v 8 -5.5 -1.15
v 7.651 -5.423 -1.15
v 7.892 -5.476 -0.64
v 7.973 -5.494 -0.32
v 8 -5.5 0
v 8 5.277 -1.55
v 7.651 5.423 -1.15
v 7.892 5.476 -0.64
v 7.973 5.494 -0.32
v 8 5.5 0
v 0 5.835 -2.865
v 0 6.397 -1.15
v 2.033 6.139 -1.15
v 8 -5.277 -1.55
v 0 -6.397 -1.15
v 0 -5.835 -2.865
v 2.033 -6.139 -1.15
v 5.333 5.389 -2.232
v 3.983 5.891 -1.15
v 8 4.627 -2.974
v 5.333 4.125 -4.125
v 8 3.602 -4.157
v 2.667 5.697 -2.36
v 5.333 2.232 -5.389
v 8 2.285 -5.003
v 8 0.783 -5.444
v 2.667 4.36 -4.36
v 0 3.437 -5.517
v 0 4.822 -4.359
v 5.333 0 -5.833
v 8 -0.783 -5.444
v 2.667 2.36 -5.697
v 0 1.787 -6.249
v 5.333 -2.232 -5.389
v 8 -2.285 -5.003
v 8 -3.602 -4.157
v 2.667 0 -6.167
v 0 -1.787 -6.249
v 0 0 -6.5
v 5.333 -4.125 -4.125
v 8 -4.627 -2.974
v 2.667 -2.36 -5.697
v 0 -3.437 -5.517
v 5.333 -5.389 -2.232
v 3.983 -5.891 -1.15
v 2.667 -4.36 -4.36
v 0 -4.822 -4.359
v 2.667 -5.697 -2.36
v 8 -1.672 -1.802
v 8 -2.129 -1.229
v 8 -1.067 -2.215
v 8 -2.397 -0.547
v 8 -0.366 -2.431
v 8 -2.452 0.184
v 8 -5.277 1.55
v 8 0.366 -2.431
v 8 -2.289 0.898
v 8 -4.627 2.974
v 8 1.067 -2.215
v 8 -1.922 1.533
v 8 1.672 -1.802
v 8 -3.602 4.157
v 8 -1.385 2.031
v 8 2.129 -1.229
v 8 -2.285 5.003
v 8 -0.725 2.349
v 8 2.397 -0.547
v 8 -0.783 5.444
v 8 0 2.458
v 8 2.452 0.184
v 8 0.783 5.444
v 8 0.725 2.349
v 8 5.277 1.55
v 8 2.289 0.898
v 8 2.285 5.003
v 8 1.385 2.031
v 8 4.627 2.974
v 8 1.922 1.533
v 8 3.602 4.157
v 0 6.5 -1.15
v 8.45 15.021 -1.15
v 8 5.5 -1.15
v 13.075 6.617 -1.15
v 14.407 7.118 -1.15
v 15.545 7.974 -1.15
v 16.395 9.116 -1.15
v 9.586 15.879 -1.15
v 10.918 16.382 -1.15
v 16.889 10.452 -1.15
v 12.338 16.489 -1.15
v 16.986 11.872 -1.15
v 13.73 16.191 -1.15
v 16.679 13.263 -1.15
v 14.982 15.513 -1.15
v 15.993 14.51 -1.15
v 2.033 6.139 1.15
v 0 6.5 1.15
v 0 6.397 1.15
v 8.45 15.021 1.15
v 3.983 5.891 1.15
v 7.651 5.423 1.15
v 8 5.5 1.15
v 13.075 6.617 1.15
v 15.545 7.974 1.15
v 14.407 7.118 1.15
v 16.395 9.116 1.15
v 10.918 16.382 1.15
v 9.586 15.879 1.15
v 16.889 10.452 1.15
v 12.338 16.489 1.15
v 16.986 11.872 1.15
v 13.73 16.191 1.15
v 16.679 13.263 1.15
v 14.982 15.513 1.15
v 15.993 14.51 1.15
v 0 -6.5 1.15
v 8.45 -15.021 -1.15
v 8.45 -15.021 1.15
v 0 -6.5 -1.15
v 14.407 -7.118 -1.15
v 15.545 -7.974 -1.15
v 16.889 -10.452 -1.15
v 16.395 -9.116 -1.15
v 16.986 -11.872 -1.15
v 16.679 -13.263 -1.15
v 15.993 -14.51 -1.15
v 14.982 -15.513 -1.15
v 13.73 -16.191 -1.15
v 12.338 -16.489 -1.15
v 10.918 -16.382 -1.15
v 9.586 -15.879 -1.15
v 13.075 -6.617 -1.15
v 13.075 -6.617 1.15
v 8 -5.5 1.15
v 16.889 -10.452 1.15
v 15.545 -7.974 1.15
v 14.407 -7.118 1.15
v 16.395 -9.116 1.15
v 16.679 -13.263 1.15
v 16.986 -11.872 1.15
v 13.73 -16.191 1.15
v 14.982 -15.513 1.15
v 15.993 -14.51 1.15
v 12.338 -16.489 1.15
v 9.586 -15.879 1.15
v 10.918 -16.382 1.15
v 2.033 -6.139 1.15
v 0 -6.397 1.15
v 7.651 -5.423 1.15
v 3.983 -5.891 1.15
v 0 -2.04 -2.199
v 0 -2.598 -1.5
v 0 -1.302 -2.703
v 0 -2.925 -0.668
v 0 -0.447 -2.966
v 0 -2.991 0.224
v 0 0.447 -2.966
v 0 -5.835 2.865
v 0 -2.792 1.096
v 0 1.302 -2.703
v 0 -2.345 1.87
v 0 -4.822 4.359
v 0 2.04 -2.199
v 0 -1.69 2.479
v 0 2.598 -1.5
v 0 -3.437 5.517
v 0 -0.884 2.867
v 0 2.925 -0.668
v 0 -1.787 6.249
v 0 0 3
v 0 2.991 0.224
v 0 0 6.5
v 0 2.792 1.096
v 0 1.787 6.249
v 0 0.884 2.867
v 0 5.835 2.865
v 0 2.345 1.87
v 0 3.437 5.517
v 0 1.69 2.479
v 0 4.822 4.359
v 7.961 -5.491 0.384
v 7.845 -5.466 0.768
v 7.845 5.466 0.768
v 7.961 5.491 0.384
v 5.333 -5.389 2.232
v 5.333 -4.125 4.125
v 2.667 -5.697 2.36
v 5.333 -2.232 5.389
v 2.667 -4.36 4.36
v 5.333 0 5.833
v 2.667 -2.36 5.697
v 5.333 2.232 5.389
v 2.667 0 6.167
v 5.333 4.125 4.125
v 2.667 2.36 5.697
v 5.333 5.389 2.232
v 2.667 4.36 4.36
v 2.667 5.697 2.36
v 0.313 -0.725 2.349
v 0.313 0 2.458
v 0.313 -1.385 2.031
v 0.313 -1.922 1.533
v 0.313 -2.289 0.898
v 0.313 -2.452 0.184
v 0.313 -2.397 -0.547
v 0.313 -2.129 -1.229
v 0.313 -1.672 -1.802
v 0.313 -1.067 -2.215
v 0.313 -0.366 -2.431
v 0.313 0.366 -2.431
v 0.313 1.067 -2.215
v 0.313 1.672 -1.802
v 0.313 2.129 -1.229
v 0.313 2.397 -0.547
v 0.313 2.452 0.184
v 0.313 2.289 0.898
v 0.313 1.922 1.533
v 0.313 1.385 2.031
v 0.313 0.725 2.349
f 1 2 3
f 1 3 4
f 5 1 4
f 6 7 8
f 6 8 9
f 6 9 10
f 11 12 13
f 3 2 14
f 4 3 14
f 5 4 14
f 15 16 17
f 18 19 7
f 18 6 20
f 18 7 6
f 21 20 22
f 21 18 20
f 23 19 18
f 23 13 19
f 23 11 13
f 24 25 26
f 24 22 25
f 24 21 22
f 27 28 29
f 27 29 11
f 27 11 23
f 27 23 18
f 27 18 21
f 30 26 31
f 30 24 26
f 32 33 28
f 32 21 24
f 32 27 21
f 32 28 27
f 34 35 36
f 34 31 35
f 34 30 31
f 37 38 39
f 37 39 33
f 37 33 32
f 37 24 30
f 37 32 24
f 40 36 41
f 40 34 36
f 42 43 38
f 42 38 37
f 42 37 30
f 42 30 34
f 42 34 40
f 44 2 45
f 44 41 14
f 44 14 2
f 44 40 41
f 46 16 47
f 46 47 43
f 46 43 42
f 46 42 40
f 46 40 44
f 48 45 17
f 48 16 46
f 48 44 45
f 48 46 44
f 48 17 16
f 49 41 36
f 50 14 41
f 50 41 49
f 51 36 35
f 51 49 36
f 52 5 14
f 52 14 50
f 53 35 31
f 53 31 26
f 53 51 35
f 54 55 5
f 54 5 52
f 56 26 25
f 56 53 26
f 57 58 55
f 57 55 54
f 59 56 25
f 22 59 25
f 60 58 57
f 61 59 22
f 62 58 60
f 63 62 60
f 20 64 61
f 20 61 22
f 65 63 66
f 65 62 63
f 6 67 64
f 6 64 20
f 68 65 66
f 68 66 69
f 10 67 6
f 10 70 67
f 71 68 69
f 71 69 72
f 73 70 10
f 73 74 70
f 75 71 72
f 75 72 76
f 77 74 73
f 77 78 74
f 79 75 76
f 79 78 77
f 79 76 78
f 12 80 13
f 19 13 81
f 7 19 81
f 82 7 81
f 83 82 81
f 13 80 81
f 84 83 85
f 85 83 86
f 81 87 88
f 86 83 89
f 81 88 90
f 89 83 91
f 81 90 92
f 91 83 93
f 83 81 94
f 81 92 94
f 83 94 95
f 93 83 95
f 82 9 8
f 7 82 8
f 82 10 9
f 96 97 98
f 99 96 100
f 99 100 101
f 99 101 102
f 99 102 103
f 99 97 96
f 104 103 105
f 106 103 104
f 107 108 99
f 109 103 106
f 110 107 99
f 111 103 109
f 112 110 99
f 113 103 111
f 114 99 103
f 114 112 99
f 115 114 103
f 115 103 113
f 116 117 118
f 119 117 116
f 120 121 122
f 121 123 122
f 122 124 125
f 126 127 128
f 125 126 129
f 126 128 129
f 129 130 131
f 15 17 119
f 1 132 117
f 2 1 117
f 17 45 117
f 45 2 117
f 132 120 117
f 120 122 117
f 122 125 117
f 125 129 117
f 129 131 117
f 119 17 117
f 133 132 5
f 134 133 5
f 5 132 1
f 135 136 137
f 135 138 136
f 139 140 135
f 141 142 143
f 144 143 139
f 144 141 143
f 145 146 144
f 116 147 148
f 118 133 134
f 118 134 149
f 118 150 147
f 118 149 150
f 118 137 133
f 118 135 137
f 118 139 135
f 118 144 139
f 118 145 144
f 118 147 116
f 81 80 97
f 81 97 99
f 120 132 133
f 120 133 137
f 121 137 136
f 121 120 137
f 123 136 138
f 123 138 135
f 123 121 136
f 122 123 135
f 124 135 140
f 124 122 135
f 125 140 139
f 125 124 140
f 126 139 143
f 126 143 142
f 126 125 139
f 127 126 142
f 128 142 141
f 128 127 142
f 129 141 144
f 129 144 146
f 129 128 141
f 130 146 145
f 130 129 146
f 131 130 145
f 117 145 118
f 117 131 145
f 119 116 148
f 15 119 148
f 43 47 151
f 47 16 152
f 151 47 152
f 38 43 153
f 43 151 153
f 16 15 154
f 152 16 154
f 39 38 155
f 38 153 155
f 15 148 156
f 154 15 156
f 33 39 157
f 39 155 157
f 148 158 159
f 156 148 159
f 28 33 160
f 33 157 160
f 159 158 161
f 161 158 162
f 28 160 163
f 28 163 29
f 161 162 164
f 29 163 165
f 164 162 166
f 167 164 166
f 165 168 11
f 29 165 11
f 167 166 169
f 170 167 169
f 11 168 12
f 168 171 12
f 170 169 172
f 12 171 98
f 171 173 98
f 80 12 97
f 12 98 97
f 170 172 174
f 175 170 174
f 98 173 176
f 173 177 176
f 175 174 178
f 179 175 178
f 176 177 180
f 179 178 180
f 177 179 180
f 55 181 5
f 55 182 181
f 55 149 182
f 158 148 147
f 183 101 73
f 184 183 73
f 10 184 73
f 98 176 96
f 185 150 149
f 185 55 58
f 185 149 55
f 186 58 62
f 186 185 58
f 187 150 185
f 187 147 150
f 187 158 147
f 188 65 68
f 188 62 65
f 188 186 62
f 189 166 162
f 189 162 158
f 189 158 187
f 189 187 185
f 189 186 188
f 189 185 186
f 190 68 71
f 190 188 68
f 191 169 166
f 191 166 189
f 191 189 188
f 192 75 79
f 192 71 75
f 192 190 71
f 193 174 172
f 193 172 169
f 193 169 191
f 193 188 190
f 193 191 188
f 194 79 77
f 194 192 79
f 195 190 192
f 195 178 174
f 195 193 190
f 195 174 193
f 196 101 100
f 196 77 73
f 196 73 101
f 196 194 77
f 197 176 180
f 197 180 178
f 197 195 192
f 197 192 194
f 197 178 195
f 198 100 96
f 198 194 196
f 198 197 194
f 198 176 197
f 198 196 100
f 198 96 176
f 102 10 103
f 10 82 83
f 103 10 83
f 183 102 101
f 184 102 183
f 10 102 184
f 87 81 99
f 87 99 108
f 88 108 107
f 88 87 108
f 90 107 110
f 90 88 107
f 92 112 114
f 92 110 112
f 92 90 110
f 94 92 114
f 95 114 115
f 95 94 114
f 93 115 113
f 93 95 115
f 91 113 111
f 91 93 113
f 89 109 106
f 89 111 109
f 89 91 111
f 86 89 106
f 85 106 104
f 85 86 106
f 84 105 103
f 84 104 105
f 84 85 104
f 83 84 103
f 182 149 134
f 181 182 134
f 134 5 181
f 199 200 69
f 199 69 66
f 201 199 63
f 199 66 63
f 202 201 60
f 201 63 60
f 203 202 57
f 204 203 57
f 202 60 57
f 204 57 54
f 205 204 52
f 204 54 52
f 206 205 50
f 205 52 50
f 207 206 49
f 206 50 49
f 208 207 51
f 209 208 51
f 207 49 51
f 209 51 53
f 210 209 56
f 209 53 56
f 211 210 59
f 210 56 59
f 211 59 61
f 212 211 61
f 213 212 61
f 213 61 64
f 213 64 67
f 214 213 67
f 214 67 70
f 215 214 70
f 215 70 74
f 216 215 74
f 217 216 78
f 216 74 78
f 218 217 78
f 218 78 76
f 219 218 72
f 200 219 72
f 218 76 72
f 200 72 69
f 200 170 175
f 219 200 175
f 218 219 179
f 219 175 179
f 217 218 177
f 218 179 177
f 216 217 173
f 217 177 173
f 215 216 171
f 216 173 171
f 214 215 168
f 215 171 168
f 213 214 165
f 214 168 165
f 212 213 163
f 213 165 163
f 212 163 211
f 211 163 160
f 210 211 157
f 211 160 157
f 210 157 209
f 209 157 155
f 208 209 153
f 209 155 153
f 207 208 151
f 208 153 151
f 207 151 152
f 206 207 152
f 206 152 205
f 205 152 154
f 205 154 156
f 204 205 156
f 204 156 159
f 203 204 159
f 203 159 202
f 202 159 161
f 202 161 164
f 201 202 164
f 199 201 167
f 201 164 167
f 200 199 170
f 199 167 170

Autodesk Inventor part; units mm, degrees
ref_plane "YZ Plane" through (0, 0, 0) normal (1, 0, 0) x (0, 1, 0)
ref_plane "XZ Plane" through (0, 0, 0) normal (0, 1, 0) x (-1, 0, 0)
sketch "Эскиз1" plane through (0, 0, 0) normal (0, 0, 1) x (1, 0, 0)
  line L0 (0, 0) -> (8, 0)
  line L1 (0, 0) -> (0, 6.5)
  line L2 (8, 5.5) -> (8, 0)
  line L3 (0, 6.5) -> (8.4497, 15.0207)
  line L4 (8, 5.5) -> (13.0747, 6.6169)
  arc A0 (13.0747, 6.6169) -> (8.4497, 15.0207) centre (12, 11.5) ccw
  line L5 (8, 5.5) -> (0, 6.5)
  line L6 (8, 5.5) -> (0, 3.7393)
  dimension "d0" = 11
  dimension "d1" = 12
  dimension "d2" = 11.5
  dimension "d3" = 5
  dimension "d4" = 8
  dimension "d5" = 13
revolve "Базовый элемент" add sketch "Эскиз1" angle 360 about axis through (0, 0, 0) along (1, 0, 0) contours L1 L6 L2 L0 | L1 L5 L6
extrude "Крыло1" add sketch "Эскиз1" along normal mid plane 2.3 contours L1 L5 L6 | L5 L3 A0 L4
fillet "Сопряжение1" [suppressed]
mirror "Крыло2" about plane through (0, 0, 0) normal (0, 1, 0) of "Крыло1"
sketch "Эскиз2" plane through (0, 0, 0) normal (1, 0, 0) x (0, 1, 0)
  line L0 (0, -14) -> (0, 14) projected
  line L1 (-14, 0) -> (14, 0) projected
  point P0 (0, 0)
hole "Резьба" at (0, 0, 0) direction (1, 0, 0) diameter 4.917 end through all thread size "M6x1" class "6H" standard "ISO Metric profile"
chamfer "Фаска1" distance 0.5413 angle 30 1 edges at (0, 0, -2.4585) measured on face at (0, -5.0785, 0.0988)
ref_plane "Work Plane1" through (39.3319, 0, 0) normal (0, 0, -1) x (1, 0, 0)
equation "\"d0\" = KOD2"
equation "\"d1\" = KOH1 - RR"
equation "\"d2\" = 0.5 * E0 - RR"
equation "\"d3\" = RR"
equation "\"d4\" = KOH"
equation "\"d5\" = KOD"
equation "\"d6\" = SW"
equation "\"d8\" = 0.333333 * SW"
equation "\"d9\" = -0.5 * GD1 + 0.5 * NND"
equation "\"d109\" = -0.5 * GD1 + 0.5 * NND"
equation "\"NND\" = 6"
equation "\"KOH\" = 8"
equation "\"KOH1\" = 17"
equation "\"SW\" = 2.3"
equation "\"KOD\" = 13"
equation "\"KOD2\" = 11"
equation "\"RR\" = 5"
equation "\"E0\" = 33"
equation "\"GUL\" = 0.541266 * PTC"
equation "\"BOR\" = 0"
equation "\"PTC\" = 1"
equation "\"THREADDIA\" = 6"
equation "\"TOA\" = 30deg"
equation "\"RR2\" = 3"
equation "\"SW1\" = 3.3"
equation "\"GAL\" = 0.541266 * PTC"
equation "\"GD1\" = 4.917468"
properties part number "DIN 315 - M6" material "Сталь, мягкая"
